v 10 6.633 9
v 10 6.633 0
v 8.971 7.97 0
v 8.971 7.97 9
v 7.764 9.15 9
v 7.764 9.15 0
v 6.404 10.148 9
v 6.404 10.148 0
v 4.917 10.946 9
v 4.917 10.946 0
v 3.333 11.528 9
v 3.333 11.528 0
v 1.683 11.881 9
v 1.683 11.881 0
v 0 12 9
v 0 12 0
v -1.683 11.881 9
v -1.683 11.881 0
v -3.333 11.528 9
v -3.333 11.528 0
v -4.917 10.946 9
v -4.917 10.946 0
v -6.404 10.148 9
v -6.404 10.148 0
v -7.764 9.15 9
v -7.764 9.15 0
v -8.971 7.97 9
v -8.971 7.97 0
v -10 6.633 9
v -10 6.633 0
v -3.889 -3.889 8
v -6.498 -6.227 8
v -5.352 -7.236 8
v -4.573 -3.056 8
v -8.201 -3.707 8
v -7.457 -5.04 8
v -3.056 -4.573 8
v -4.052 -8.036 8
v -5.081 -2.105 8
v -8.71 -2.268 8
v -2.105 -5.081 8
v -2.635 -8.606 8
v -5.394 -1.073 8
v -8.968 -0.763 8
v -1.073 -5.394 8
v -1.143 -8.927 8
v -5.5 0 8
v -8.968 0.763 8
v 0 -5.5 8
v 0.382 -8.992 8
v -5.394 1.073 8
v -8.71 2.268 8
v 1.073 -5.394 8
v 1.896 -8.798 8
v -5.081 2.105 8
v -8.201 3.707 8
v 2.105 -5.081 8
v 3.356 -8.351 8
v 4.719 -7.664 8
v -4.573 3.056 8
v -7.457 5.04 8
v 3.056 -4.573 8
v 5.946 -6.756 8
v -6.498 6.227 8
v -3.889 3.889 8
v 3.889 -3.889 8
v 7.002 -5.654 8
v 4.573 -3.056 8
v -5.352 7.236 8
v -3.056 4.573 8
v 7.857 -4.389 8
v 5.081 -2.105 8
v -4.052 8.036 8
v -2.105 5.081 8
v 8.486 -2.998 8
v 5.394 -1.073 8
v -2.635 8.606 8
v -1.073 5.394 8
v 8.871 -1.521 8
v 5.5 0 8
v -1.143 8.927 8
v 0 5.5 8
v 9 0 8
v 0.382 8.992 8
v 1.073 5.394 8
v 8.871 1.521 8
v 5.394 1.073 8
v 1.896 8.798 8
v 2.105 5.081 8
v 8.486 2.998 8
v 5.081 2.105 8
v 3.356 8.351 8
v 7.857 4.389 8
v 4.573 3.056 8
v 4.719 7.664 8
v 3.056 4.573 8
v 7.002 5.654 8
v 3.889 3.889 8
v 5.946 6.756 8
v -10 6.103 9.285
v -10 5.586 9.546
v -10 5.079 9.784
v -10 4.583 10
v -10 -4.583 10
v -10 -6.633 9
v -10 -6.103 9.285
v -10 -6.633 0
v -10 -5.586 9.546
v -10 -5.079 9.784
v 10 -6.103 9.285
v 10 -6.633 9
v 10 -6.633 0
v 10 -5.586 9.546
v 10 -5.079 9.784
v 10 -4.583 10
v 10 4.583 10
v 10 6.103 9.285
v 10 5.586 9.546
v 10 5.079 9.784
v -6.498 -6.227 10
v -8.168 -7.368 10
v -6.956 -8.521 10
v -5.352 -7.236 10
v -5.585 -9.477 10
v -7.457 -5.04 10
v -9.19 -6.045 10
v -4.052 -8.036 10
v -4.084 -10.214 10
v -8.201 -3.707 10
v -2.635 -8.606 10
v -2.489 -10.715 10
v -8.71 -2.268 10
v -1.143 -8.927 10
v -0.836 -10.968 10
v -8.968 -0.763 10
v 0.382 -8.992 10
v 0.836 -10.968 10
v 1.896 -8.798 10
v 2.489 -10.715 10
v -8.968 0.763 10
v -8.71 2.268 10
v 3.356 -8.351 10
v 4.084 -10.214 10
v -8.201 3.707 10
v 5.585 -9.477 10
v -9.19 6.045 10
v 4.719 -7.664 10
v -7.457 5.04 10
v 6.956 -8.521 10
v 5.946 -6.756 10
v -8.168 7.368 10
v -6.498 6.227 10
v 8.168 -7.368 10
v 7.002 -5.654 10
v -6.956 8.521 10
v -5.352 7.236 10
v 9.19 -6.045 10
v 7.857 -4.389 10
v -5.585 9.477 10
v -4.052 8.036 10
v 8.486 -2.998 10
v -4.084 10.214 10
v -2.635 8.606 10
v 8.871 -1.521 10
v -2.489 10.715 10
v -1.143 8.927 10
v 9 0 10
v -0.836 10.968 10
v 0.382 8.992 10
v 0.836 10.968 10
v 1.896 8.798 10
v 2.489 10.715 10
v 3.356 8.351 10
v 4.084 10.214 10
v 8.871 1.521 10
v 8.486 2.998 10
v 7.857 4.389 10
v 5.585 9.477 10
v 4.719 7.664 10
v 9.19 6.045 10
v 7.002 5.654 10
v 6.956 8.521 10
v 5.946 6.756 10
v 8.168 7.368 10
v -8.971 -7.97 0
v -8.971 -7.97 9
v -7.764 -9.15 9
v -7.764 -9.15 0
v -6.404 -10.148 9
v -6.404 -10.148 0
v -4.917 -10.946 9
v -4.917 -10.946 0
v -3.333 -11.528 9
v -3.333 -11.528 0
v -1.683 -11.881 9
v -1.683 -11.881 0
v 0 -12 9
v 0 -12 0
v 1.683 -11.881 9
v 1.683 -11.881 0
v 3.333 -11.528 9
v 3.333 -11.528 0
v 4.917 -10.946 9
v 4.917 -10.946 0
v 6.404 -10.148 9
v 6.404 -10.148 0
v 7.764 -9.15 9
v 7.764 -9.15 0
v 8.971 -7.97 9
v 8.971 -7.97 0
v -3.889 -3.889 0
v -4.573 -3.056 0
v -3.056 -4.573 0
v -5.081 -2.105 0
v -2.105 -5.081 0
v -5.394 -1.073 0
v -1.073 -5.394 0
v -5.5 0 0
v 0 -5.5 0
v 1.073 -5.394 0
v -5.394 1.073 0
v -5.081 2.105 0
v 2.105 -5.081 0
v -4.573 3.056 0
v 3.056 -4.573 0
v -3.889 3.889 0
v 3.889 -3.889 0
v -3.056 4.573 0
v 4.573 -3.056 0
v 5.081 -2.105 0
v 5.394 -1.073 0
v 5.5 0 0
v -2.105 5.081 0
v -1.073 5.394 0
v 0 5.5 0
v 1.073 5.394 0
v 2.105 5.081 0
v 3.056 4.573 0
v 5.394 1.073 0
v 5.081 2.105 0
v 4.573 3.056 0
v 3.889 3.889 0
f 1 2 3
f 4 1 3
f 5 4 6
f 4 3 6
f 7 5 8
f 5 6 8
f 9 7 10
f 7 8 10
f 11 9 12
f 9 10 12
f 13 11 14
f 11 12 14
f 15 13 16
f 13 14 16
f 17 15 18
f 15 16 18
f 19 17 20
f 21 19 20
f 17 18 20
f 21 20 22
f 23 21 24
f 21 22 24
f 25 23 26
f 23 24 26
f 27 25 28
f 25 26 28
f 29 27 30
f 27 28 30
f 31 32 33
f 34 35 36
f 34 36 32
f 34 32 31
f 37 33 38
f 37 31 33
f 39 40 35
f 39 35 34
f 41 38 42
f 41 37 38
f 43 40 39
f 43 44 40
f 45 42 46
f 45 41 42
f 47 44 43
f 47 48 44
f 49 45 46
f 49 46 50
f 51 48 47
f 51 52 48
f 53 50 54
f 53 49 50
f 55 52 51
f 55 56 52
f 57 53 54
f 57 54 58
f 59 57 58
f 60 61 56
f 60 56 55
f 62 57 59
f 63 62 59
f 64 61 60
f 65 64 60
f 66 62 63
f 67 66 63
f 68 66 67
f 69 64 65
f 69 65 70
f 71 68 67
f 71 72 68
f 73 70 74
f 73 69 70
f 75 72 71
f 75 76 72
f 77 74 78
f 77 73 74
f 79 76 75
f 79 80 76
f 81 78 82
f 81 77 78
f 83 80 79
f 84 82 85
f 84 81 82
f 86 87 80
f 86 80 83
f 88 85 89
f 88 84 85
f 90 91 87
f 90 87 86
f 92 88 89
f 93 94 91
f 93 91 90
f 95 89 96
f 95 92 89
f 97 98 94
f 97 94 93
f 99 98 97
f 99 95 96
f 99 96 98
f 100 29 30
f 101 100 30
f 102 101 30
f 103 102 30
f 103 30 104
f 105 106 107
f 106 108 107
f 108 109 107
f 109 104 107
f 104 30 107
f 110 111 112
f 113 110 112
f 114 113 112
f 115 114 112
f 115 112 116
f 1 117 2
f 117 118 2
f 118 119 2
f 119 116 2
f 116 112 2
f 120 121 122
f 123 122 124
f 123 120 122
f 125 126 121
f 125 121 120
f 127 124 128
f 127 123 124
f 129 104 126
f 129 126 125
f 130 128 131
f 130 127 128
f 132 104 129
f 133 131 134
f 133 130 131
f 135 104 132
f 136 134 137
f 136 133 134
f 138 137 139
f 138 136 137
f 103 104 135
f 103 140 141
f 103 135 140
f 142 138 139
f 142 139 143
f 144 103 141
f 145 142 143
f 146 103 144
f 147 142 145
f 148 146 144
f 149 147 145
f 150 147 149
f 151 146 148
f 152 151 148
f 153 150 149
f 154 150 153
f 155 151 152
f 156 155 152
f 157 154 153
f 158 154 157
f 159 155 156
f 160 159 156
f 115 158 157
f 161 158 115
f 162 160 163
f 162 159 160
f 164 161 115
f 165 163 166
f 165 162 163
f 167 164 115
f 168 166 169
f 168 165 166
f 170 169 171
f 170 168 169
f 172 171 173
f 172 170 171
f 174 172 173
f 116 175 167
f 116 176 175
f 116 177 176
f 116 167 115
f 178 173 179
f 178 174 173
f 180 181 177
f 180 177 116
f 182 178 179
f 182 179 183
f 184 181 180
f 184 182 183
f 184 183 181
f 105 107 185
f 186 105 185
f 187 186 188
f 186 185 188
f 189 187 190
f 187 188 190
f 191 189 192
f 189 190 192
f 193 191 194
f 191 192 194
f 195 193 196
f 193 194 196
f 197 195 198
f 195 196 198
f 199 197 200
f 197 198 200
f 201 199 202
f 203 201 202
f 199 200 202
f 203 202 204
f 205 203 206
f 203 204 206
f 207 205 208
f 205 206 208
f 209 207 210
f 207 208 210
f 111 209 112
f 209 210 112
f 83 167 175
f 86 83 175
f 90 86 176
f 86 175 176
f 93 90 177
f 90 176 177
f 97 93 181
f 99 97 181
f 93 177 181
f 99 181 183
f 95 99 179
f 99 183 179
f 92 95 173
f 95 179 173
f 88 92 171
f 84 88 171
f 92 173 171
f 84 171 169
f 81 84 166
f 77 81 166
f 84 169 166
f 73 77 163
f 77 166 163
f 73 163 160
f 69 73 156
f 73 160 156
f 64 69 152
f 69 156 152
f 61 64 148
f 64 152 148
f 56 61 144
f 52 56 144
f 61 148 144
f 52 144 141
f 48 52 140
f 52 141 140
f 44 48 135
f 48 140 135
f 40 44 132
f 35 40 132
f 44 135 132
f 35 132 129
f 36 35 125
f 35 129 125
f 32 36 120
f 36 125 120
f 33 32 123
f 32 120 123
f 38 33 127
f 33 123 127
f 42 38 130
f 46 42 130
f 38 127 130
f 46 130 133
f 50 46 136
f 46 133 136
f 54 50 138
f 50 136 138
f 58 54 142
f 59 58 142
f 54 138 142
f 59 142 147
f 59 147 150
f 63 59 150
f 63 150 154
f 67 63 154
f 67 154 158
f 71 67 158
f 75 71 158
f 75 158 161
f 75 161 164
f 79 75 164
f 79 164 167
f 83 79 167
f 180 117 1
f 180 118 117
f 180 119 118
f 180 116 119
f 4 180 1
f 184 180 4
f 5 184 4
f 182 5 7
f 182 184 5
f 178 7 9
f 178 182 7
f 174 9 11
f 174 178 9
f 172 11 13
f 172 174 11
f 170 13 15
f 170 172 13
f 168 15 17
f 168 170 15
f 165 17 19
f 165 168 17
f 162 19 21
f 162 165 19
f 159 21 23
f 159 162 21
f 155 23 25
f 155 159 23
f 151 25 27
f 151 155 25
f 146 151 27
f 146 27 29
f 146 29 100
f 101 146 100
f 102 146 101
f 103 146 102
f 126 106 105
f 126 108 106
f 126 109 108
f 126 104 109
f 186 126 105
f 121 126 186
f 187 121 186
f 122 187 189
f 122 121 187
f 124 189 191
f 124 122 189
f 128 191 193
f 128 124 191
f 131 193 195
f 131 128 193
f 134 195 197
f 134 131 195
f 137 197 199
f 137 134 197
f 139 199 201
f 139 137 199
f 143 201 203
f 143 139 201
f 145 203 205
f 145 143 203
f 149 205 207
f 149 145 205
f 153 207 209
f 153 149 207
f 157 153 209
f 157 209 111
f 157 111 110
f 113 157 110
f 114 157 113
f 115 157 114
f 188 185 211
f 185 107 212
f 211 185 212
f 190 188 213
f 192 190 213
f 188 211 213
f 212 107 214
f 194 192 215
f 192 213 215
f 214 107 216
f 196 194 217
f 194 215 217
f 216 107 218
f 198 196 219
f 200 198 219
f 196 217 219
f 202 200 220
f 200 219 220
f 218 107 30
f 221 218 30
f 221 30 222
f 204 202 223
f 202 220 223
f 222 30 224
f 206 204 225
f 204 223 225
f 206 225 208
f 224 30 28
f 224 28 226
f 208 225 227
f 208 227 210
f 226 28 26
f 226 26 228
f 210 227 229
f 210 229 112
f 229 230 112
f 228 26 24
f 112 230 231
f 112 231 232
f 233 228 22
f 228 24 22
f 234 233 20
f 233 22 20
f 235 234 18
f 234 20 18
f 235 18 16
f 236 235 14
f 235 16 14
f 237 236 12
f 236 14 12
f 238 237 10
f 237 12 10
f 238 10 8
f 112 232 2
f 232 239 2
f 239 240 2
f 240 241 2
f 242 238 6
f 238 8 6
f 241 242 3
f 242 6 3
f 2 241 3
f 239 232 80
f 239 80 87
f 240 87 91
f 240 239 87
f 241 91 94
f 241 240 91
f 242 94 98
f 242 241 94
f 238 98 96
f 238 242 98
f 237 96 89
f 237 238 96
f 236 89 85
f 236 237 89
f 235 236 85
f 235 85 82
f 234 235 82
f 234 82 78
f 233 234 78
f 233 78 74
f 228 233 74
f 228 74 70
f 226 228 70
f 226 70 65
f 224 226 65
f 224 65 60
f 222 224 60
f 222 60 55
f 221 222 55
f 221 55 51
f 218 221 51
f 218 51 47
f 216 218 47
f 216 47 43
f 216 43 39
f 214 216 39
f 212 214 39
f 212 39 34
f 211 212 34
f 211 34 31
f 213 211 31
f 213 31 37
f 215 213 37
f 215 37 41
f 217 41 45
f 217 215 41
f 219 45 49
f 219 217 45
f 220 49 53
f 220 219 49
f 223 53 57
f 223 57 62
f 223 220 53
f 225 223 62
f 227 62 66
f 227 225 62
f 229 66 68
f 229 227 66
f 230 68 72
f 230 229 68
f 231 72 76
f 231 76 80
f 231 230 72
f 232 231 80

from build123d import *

# Parameters (mm, degrees)
F0_R     = 5.5
F1_DEPTH = 10
F2_R     = 9
F2_R_2   = 5.5
F3_DEPTH = 2
F4_SIZE  = 1


with BuildPart() as f1:
    # F0 (on Top) → F1 (new body)
    with BuildSketch(Plane.XY):
        with BuildLine():
            Line((10, -6.63325), (10, 6.63325))
            ThreePointArc((10, 6.63325), (0, 12), (-10, 6.63325))
            Line((-10, 6.63325), (-10, -6.63325))
            ThreePointArc((-10, -6.63325), (0, -12), (10, -6.63325))
        make_face()
        Circle(F0_R, mode=Mode.SUBTRACT)
    extrude(amount=F1_DEPTH)

    # F2 (on face) → F3 (cut)
    with BuildSketch(Plane.XY.offset(10)):
        Circle(F2_R)
        Circle(F2_R_2, mode=Mode.SUBTRACT)
    extrude(amount=-F3_DEPTH, mode=Mode.SUBTRACT)

    # F4
    f4_edges = [f1.edges().sort_by_distance(p)[0] for p in [
        (0, -12, 10),
        (0, 12, 10),
    ]]
    chamfer(f4_edges, length=F4_SIZE)


solid = f1.part
